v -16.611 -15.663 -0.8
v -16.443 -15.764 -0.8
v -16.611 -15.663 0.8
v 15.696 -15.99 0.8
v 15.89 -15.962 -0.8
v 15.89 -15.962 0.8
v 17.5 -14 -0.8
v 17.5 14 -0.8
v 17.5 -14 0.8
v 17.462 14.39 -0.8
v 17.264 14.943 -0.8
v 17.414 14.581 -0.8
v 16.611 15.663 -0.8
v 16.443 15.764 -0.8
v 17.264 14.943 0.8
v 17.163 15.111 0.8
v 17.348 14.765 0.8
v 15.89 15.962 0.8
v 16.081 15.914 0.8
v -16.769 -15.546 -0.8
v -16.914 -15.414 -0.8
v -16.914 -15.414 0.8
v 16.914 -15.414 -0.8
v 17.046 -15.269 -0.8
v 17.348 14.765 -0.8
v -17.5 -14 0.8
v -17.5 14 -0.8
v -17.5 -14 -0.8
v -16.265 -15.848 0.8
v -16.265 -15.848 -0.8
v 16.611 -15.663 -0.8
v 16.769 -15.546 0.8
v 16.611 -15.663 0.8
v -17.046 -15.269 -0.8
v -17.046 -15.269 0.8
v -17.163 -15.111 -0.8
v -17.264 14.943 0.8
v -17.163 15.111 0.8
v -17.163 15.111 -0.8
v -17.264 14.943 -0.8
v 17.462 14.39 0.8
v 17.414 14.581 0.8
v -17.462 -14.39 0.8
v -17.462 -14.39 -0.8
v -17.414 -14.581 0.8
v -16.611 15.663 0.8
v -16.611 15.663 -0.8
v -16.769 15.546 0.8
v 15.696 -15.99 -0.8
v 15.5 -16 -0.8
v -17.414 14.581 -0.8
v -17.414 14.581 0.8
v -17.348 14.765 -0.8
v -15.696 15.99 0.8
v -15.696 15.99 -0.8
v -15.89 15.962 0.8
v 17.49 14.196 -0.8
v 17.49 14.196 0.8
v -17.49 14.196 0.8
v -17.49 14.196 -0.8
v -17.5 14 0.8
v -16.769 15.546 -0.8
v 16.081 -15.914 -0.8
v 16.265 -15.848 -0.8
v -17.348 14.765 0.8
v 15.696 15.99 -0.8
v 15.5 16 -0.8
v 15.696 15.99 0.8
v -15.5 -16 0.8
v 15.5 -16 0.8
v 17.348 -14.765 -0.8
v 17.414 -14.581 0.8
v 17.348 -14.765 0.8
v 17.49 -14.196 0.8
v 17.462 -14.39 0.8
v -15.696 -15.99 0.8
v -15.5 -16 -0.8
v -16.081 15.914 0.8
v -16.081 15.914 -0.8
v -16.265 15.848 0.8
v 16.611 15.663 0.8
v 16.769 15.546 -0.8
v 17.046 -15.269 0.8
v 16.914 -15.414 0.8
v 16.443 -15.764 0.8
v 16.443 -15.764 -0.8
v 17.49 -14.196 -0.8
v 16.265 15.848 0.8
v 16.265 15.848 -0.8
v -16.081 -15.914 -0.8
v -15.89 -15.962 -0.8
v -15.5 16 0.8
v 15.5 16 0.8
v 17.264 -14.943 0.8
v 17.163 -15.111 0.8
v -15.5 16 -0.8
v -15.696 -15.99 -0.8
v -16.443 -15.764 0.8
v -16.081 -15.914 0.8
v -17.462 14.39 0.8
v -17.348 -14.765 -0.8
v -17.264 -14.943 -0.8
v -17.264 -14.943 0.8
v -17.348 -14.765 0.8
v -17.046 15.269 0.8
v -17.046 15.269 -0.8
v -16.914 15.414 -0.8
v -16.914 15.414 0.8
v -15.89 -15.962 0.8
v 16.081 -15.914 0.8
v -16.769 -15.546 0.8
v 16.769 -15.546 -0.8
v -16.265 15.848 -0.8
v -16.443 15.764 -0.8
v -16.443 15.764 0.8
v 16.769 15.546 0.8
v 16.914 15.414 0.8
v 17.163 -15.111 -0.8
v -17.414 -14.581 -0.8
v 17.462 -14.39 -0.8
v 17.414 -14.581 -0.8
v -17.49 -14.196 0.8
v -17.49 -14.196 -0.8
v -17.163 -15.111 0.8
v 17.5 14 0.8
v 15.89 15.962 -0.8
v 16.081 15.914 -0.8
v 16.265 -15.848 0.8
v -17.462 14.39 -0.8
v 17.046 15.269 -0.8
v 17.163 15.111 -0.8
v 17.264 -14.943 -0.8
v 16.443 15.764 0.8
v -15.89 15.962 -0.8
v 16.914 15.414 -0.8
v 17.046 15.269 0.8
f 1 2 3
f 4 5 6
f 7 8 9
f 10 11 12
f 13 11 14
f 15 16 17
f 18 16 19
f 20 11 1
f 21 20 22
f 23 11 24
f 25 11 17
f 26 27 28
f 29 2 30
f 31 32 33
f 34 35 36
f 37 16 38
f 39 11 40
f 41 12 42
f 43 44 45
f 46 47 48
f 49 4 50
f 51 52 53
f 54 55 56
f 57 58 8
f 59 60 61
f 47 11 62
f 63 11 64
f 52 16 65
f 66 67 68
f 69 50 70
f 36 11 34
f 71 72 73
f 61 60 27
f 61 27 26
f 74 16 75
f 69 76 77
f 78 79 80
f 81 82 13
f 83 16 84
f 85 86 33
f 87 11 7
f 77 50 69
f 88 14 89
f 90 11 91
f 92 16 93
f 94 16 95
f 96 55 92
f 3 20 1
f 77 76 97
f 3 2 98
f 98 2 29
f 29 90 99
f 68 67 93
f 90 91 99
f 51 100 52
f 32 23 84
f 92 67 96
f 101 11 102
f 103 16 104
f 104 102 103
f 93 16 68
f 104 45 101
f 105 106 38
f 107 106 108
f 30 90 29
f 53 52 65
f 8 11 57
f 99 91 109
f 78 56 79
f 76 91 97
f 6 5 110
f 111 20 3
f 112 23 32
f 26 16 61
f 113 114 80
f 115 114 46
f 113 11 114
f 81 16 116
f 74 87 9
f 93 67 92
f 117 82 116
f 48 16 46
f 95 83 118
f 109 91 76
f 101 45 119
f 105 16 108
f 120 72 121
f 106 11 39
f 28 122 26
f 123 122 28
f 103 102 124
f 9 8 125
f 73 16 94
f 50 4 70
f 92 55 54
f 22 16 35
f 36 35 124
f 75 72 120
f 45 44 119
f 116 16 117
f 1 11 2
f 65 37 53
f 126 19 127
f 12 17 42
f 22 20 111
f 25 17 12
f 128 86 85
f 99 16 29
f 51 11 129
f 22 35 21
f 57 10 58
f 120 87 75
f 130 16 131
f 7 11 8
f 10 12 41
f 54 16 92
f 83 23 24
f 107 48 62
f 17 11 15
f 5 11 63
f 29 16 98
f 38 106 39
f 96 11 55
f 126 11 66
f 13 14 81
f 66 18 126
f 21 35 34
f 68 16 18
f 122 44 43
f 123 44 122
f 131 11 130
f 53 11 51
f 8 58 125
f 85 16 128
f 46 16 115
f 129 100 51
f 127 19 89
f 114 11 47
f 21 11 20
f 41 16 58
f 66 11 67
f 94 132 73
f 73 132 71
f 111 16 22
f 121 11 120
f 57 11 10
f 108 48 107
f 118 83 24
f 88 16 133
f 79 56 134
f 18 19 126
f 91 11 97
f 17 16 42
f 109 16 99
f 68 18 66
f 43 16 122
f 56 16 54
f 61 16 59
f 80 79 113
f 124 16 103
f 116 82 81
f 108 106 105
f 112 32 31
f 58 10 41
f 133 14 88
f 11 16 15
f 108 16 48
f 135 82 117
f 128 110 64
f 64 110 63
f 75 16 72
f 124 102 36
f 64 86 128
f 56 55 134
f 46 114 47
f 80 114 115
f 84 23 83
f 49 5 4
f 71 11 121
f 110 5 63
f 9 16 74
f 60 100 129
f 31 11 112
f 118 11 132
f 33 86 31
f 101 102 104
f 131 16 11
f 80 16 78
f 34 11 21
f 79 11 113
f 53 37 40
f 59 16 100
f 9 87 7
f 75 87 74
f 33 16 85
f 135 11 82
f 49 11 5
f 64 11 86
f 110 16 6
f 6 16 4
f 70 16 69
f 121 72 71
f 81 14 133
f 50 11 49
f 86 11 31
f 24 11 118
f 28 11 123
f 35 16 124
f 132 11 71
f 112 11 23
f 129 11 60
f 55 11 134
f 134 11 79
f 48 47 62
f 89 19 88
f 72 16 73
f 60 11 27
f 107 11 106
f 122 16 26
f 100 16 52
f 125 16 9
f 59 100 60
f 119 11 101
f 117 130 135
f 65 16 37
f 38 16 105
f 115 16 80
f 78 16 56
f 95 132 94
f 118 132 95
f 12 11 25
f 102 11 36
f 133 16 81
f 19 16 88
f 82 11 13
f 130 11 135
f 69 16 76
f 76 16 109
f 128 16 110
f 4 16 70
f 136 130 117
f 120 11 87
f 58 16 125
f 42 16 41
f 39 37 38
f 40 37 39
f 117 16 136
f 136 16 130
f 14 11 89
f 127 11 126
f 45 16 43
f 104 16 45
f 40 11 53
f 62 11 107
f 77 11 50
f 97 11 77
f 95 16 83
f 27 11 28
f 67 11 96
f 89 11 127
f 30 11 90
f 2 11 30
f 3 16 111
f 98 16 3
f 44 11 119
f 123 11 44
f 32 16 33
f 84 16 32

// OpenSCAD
// Motor driver module PCB
// Target size: 35.0mm x 32.0mm x 1.6mm (one connected solid)

length_mm    = 35.0;
width_mm     = 32.0;
thickness_mm = 1.6;

$fn = 64;

module pcb_module() {
    corner_r = min(2.0, min(length_mm, width_mm)/6);

    // Robust, always-visible solid using a 3D rounded-rectangle (no 2D offset/eps issues)
    color([0.0, 0.4, 0.2])
    hull() {
        for (sx = [-1, 1], sy = [-1, 1])
            translate([sx*(length_mm/2 - corner_r), sy*(width_mm/2 - corner_r), 0])
                cylinder(r = corner_r, h = thickness_mm, center = true);
    }
}

pcb_module();
